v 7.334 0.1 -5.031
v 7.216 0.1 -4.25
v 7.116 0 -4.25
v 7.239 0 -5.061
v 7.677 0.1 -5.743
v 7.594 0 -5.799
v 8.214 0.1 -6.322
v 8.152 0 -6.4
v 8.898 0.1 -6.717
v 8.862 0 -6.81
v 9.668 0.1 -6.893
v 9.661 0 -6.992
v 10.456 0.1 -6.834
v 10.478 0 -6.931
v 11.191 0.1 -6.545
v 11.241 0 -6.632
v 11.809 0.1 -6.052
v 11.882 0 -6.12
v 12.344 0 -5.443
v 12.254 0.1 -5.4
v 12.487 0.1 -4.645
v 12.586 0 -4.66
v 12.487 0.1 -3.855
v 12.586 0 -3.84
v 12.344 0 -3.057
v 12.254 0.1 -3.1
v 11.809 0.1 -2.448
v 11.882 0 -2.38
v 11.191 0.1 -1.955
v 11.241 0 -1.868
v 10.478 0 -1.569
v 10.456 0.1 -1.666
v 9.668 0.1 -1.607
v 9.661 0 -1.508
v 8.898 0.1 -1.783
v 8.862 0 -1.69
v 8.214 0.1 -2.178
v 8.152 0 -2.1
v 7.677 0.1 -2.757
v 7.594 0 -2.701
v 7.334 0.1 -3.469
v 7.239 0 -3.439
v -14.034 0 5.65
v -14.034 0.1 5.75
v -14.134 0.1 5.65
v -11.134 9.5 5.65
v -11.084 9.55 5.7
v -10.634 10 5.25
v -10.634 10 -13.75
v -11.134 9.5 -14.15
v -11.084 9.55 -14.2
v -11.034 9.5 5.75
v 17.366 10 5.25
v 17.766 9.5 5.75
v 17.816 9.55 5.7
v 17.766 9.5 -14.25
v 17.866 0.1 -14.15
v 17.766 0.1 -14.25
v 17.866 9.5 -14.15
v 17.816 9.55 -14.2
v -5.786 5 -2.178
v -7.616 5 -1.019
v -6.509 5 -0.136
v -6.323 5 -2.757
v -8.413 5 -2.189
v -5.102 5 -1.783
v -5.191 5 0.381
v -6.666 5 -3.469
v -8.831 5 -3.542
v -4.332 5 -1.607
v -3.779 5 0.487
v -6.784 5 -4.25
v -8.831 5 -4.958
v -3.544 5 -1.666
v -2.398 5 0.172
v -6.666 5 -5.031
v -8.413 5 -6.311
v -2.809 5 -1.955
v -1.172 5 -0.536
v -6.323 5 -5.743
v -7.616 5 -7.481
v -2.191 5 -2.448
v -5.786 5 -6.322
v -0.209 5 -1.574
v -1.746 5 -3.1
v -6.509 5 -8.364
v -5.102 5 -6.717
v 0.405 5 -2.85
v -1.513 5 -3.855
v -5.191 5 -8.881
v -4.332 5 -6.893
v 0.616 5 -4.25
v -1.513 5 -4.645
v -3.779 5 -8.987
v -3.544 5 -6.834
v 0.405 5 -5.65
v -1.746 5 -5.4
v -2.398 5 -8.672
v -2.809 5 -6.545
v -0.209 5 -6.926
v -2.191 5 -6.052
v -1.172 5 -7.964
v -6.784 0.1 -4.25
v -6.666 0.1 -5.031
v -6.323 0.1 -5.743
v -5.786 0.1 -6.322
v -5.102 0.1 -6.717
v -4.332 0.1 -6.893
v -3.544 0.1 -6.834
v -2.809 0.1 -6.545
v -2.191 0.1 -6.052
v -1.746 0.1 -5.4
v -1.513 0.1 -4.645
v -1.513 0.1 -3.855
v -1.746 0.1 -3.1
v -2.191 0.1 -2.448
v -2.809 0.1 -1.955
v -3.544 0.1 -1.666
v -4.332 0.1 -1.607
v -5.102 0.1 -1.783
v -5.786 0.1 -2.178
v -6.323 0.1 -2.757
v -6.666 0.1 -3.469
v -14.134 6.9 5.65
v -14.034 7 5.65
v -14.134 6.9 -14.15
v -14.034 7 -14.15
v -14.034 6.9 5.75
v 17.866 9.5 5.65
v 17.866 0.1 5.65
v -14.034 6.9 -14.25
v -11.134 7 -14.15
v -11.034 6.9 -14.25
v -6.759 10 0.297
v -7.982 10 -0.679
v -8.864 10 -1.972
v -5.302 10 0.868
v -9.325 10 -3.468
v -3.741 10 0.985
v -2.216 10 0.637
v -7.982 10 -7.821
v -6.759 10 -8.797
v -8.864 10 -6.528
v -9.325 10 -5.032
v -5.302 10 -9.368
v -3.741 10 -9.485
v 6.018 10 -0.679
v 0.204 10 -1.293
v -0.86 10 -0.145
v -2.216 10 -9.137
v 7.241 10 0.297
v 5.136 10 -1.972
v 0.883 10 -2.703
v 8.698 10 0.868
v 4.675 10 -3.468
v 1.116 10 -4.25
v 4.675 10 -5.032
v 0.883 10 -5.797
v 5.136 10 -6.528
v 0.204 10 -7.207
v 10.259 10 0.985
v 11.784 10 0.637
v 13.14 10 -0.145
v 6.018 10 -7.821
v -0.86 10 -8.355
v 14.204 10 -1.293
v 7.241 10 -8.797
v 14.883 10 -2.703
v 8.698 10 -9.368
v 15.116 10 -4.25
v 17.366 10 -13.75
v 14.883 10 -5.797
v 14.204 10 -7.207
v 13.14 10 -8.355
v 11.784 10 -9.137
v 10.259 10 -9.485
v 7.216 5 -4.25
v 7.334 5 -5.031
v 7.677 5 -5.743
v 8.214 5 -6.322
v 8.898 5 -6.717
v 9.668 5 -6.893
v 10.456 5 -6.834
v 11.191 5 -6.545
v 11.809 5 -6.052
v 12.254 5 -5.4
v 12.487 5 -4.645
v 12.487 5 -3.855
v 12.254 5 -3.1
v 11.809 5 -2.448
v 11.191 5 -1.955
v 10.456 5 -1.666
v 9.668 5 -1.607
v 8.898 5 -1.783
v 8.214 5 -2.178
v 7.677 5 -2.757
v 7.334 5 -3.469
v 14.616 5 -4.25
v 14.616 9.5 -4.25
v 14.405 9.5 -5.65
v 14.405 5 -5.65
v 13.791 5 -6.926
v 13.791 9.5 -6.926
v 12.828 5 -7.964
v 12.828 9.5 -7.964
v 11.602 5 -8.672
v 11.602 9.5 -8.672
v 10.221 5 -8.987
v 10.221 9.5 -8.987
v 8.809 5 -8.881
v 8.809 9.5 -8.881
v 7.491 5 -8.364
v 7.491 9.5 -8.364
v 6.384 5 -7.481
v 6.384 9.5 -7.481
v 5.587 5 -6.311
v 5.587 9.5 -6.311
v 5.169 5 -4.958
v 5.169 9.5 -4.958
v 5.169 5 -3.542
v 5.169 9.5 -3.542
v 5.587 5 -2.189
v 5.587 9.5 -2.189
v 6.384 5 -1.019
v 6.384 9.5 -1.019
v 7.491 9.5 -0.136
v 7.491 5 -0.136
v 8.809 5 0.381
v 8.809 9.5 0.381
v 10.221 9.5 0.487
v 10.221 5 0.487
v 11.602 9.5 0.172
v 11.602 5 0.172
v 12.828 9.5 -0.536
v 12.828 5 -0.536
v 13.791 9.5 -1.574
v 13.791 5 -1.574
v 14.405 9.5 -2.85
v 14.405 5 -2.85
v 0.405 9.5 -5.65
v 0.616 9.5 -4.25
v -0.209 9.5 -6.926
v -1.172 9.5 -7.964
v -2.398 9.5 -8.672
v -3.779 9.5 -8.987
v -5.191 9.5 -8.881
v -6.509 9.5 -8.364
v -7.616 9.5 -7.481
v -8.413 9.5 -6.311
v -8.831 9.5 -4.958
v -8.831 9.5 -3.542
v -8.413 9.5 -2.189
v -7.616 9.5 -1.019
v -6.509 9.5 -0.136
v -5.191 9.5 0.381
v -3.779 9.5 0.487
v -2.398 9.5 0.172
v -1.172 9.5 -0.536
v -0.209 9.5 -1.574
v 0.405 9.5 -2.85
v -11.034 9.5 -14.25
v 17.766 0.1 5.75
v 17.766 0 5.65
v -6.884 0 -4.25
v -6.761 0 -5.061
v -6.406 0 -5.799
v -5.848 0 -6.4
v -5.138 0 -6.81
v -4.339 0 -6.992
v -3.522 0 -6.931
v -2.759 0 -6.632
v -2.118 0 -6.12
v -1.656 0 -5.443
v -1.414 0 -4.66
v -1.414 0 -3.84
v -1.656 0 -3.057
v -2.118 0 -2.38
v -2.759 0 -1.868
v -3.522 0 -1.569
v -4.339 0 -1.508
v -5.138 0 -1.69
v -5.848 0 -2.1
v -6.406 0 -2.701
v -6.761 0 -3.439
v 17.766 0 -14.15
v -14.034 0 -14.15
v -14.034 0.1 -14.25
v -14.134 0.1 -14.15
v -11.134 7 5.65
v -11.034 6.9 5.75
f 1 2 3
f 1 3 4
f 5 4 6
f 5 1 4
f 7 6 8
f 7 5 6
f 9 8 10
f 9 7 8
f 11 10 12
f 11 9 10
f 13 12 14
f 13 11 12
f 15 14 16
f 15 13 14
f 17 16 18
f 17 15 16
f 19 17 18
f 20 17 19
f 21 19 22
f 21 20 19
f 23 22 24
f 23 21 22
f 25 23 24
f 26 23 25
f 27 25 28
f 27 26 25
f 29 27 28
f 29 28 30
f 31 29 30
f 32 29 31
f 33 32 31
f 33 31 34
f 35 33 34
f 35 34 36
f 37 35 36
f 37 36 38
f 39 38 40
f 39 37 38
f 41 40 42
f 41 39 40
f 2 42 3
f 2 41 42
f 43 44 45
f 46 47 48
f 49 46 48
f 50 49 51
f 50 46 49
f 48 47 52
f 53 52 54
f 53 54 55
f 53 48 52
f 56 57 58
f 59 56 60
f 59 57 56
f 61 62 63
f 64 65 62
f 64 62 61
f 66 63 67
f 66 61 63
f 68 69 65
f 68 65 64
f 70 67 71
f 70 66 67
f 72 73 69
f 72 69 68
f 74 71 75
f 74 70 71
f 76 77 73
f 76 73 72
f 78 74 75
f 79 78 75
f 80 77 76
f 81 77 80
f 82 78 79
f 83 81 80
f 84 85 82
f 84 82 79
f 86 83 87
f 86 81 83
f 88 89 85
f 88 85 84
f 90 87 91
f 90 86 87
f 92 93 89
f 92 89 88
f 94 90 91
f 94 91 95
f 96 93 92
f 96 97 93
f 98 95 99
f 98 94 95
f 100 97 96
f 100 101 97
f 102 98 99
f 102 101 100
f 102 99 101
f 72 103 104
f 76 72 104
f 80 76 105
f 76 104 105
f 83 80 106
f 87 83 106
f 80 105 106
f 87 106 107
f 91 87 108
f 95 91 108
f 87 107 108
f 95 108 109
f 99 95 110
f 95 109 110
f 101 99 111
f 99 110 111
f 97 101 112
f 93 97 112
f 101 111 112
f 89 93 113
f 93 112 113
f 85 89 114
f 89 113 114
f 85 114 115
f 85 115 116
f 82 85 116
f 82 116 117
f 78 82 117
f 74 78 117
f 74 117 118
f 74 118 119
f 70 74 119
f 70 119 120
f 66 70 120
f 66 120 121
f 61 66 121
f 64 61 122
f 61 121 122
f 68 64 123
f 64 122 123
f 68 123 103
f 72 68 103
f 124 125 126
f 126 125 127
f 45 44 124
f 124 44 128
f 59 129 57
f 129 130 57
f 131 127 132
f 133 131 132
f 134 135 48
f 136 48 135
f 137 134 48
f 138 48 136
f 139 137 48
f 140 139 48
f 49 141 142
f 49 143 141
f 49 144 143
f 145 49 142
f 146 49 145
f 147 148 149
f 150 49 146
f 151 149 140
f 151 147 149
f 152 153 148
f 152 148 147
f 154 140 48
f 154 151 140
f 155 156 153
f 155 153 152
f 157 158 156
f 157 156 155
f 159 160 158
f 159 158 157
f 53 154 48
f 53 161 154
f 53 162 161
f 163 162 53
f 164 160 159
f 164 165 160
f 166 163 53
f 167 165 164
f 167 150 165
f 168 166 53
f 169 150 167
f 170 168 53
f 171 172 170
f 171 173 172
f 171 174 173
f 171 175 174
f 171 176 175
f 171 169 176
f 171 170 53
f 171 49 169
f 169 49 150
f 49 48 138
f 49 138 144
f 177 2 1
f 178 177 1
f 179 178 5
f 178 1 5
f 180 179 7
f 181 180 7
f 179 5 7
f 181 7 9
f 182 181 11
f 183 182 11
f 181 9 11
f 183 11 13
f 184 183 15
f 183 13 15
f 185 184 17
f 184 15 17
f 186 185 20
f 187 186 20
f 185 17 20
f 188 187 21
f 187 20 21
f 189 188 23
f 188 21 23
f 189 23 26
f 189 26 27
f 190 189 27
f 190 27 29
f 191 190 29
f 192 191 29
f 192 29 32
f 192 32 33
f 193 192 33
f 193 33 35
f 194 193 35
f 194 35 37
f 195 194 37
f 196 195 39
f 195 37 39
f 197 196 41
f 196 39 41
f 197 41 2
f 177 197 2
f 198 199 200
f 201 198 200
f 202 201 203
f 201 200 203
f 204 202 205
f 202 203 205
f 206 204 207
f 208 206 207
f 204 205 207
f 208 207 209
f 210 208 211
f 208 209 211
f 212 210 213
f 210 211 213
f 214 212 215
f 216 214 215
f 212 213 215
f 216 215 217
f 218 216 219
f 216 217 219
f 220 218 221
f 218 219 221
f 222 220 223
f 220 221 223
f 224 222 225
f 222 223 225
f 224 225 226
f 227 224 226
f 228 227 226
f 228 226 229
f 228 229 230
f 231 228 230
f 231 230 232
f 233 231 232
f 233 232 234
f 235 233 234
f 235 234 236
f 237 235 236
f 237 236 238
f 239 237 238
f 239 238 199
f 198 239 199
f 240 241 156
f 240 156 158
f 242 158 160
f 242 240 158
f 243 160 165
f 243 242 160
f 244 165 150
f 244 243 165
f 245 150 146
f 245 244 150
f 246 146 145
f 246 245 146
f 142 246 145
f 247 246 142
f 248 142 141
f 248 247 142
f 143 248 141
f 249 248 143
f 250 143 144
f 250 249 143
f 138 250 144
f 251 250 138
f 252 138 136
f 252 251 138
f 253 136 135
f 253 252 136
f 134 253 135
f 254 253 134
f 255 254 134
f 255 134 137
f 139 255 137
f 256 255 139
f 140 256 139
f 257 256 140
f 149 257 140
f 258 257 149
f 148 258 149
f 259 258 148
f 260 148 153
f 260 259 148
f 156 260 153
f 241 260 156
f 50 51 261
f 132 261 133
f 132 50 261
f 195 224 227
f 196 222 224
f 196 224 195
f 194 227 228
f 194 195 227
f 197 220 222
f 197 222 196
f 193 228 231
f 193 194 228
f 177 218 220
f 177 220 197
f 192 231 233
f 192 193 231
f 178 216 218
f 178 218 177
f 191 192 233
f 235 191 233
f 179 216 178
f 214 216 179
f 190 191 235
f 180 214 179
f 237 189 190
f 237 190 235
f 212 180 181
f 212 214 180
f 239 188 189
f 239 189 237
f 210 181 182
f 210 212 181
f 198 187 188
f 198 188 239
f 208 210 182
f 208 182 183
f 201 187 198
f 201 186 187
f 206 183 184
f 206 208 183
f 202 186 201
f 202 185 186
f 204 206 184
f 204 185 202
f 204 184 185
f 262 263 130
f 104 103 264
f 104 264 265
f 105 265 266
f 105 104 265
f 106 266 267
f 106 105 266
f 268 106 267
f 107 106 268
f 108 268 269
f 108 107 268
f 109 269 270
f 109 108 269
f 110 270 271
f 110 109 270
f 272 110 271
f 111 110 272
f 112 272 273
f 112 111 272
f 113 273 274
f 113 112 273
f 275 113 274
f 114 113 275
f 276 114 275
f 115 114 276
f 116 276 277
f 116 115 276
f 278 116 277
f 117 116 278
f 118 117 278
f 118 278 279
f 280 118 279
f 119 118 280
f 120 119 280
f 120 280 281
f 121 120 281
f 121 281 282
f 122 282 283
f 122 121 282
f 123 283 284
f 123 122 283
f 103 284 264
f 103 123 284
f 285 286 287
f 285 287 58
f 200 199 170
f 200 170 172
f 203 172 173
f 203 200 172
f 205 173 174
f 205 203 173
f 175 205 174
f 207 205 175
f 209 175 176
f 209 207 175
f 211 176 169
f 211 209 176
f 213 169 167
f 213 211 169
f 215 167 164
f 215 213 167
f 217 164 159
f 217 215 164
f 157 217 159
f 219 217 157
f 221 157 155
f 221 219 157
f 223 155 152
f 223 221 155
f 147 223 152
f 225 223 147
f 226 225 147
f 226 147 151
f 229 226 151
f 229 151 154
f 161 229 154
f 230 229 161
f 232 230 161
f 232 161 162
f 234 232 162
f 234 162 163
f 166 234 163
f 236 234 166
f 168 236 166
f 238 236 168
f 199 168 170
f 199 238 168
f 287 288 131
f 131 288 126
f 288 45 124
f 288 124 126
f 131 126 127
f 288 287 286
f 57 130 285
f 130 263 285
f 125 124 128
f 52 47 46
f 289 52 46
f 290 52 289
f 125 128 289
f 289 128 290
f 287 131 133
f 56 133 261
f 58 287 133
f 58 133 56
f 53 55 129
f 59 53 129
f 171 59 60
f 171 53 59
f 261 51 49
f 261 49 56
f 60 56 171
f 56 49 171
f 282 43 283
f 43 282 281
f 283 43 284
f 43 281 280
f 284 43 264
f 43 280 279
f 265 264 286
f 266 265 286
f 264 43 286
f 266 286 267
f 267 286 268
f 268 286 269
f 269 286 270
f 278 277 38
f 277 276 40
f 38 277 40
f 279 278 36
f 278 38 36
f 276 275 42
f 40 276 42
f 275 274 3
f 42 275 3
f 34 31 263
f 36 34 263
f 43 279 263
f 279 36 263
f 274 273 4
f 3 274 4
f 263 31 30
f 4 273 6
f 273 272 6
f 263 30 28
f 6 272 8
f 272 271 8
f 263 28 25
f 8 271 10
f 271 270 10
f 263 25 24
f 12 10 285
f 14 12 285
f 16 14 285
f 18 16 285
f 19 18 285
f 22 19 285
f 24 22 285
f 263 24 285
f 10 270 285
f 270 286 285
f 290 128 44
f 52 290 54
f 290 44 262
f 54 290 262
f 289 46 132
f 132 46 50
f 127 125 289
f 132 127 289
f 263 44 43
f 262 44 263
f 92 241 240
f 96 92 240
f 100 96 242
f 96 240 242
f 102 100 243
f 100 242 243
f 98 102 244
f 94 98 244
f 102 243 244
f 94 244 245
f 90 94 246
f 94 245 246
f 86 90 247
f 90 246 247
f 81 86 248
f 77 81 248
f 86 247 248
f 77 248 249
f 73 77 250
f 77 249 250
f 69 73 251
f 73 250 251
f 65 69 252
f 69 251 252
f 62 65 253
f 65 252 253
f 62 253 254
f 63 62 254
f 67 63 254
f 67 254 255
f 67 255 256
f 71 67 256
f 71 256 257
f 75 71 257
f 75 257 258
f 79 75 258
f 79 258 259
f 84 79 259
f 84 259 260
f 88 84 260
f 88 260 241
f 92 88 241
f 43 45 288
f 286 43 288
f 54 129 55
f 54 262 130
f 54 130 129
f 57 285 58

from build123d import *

# Parameters (mm, degrees)
SKETCH1_W                      = 32
SKETCH1_H                      = 20
SKETCH1_R                      = 1.5
BOSS_EXTRUDE1_DEPTH            = 10
CBORE_FOR_M5_SHCS1_D           = 5.3
CBORE_FOR_M5_SHCS1_CBORE_D     = 9.5
CBORE_FOR_M5_SHCS1_CBORE_DEPTH = 5
SKETCH7_W                      = 3
SKETCH7_H                      = 20
CUT_EXTRUDE1_DEPTH             = 3
CHAMFER1_SIZE                  = 0.5
CHAMFER2_SIZE                  = 0.1


with BuildPart() as part:
    # Sketch1 → Boss-Extrude1 (new body)
    with BuildSketch(Plane(origin=(0, 0, 0), x_dir=(1, 0, 0), z_dir=(0, 1, 0))):
        with Locations((1.866408356, 4.25)):
            Rectangle(SKETCH1_W, SKETCH1_H)
        with Locations(Location((-4.133591644, 4.25, 0), (0, 0, 270))):
            Circle(SKETCH1_R, mode=Mode.SUBTRACT)
        with Locations(Location((9.866408356, 4.25, 0), (0, 0, 270))):
            Circle(SKETCH1_R, mode=Mode.SUBTRACT)
    extrude(amount=BOSS_EXTRUDE1_DEPTH)

    # CBORE for M5 SHCS1 (through all)
    with Locations(Plane(origin=(0, 10, 0), x_dir=(1, 0, 0), z_dir=(0, 1, 0))):
        with Locations((-4.133591644, 4.25), (9.866408356, 4.25)):
            CounterBoreHole(CBORE_FOR_M5_SHCS1_D / 2, CBORE_FOR_M5_SHCS1_CBORE_D / 2, CBORE_FOR_M5_SHCS1_CBORE_DEPTH)

    # Sketch7 → Cut-Extrude1 (cut)
    with BuildSketch(Plane(origin=(0, 10, 0), x_dir=(1, 0, 0), z_dir=(0, 1, 0))):
        with Locations((-12.633591644, 4.25)):
            Rectangle(SKETCH7_W, SKETCH7_H)
    extrude(amount=-CUT_EXTRUDE1_DEPTH, mode=Mode.SUBTRACT)

    # Chamfer1
    chamfer1_edges = [part.edges().sort_by_distance(p)[0] for p in [
        (17.866408356, 10, -4.25),
        (3.366408356, 10, -14.25),
        (5.116408356, 10, -4.25),
        (-8.883591644, 10, -4.25),
        (3.366408356, 10, 5.75),
        (-11.133591644, 10, -4.25),
    ]]
    chamfer(chamfer1_edges, length=CHAMFER1_SIZE)

    # Chamfer2
    chamfer2_edges = [part.edges().sort_by_distance(p)[0] for p in [
        (12.516408356, 0, -4.25),
        (-1.483591644, 0, -4.25),
        (-14.133591644, 3.5, -14.25),
        (-14.133591644, 3.5, 5.75),
        (-14.133591644, 7, -4.25),
        (-12.633591644, 7, -14.25),
        (-11.133591644, 8.25, -14.25),
        (-12.633591644, 7, 5.75),
        (-11.133591644, 8.25, 5.75),
        (1.866408356, 0, -14.25),
        (17.866408356, 0, -4.25),
        (1.866408356, 0, 5.75),
        (-14.133591644, 0, -4.25),
        (17.866408356, 4.75, 5.75),
        (17.866408356, 4.75, -14.25),
    ]]
    chamfer(chamfer2_edges, length=CHAMFER2_SIZE)


solid = part.part
